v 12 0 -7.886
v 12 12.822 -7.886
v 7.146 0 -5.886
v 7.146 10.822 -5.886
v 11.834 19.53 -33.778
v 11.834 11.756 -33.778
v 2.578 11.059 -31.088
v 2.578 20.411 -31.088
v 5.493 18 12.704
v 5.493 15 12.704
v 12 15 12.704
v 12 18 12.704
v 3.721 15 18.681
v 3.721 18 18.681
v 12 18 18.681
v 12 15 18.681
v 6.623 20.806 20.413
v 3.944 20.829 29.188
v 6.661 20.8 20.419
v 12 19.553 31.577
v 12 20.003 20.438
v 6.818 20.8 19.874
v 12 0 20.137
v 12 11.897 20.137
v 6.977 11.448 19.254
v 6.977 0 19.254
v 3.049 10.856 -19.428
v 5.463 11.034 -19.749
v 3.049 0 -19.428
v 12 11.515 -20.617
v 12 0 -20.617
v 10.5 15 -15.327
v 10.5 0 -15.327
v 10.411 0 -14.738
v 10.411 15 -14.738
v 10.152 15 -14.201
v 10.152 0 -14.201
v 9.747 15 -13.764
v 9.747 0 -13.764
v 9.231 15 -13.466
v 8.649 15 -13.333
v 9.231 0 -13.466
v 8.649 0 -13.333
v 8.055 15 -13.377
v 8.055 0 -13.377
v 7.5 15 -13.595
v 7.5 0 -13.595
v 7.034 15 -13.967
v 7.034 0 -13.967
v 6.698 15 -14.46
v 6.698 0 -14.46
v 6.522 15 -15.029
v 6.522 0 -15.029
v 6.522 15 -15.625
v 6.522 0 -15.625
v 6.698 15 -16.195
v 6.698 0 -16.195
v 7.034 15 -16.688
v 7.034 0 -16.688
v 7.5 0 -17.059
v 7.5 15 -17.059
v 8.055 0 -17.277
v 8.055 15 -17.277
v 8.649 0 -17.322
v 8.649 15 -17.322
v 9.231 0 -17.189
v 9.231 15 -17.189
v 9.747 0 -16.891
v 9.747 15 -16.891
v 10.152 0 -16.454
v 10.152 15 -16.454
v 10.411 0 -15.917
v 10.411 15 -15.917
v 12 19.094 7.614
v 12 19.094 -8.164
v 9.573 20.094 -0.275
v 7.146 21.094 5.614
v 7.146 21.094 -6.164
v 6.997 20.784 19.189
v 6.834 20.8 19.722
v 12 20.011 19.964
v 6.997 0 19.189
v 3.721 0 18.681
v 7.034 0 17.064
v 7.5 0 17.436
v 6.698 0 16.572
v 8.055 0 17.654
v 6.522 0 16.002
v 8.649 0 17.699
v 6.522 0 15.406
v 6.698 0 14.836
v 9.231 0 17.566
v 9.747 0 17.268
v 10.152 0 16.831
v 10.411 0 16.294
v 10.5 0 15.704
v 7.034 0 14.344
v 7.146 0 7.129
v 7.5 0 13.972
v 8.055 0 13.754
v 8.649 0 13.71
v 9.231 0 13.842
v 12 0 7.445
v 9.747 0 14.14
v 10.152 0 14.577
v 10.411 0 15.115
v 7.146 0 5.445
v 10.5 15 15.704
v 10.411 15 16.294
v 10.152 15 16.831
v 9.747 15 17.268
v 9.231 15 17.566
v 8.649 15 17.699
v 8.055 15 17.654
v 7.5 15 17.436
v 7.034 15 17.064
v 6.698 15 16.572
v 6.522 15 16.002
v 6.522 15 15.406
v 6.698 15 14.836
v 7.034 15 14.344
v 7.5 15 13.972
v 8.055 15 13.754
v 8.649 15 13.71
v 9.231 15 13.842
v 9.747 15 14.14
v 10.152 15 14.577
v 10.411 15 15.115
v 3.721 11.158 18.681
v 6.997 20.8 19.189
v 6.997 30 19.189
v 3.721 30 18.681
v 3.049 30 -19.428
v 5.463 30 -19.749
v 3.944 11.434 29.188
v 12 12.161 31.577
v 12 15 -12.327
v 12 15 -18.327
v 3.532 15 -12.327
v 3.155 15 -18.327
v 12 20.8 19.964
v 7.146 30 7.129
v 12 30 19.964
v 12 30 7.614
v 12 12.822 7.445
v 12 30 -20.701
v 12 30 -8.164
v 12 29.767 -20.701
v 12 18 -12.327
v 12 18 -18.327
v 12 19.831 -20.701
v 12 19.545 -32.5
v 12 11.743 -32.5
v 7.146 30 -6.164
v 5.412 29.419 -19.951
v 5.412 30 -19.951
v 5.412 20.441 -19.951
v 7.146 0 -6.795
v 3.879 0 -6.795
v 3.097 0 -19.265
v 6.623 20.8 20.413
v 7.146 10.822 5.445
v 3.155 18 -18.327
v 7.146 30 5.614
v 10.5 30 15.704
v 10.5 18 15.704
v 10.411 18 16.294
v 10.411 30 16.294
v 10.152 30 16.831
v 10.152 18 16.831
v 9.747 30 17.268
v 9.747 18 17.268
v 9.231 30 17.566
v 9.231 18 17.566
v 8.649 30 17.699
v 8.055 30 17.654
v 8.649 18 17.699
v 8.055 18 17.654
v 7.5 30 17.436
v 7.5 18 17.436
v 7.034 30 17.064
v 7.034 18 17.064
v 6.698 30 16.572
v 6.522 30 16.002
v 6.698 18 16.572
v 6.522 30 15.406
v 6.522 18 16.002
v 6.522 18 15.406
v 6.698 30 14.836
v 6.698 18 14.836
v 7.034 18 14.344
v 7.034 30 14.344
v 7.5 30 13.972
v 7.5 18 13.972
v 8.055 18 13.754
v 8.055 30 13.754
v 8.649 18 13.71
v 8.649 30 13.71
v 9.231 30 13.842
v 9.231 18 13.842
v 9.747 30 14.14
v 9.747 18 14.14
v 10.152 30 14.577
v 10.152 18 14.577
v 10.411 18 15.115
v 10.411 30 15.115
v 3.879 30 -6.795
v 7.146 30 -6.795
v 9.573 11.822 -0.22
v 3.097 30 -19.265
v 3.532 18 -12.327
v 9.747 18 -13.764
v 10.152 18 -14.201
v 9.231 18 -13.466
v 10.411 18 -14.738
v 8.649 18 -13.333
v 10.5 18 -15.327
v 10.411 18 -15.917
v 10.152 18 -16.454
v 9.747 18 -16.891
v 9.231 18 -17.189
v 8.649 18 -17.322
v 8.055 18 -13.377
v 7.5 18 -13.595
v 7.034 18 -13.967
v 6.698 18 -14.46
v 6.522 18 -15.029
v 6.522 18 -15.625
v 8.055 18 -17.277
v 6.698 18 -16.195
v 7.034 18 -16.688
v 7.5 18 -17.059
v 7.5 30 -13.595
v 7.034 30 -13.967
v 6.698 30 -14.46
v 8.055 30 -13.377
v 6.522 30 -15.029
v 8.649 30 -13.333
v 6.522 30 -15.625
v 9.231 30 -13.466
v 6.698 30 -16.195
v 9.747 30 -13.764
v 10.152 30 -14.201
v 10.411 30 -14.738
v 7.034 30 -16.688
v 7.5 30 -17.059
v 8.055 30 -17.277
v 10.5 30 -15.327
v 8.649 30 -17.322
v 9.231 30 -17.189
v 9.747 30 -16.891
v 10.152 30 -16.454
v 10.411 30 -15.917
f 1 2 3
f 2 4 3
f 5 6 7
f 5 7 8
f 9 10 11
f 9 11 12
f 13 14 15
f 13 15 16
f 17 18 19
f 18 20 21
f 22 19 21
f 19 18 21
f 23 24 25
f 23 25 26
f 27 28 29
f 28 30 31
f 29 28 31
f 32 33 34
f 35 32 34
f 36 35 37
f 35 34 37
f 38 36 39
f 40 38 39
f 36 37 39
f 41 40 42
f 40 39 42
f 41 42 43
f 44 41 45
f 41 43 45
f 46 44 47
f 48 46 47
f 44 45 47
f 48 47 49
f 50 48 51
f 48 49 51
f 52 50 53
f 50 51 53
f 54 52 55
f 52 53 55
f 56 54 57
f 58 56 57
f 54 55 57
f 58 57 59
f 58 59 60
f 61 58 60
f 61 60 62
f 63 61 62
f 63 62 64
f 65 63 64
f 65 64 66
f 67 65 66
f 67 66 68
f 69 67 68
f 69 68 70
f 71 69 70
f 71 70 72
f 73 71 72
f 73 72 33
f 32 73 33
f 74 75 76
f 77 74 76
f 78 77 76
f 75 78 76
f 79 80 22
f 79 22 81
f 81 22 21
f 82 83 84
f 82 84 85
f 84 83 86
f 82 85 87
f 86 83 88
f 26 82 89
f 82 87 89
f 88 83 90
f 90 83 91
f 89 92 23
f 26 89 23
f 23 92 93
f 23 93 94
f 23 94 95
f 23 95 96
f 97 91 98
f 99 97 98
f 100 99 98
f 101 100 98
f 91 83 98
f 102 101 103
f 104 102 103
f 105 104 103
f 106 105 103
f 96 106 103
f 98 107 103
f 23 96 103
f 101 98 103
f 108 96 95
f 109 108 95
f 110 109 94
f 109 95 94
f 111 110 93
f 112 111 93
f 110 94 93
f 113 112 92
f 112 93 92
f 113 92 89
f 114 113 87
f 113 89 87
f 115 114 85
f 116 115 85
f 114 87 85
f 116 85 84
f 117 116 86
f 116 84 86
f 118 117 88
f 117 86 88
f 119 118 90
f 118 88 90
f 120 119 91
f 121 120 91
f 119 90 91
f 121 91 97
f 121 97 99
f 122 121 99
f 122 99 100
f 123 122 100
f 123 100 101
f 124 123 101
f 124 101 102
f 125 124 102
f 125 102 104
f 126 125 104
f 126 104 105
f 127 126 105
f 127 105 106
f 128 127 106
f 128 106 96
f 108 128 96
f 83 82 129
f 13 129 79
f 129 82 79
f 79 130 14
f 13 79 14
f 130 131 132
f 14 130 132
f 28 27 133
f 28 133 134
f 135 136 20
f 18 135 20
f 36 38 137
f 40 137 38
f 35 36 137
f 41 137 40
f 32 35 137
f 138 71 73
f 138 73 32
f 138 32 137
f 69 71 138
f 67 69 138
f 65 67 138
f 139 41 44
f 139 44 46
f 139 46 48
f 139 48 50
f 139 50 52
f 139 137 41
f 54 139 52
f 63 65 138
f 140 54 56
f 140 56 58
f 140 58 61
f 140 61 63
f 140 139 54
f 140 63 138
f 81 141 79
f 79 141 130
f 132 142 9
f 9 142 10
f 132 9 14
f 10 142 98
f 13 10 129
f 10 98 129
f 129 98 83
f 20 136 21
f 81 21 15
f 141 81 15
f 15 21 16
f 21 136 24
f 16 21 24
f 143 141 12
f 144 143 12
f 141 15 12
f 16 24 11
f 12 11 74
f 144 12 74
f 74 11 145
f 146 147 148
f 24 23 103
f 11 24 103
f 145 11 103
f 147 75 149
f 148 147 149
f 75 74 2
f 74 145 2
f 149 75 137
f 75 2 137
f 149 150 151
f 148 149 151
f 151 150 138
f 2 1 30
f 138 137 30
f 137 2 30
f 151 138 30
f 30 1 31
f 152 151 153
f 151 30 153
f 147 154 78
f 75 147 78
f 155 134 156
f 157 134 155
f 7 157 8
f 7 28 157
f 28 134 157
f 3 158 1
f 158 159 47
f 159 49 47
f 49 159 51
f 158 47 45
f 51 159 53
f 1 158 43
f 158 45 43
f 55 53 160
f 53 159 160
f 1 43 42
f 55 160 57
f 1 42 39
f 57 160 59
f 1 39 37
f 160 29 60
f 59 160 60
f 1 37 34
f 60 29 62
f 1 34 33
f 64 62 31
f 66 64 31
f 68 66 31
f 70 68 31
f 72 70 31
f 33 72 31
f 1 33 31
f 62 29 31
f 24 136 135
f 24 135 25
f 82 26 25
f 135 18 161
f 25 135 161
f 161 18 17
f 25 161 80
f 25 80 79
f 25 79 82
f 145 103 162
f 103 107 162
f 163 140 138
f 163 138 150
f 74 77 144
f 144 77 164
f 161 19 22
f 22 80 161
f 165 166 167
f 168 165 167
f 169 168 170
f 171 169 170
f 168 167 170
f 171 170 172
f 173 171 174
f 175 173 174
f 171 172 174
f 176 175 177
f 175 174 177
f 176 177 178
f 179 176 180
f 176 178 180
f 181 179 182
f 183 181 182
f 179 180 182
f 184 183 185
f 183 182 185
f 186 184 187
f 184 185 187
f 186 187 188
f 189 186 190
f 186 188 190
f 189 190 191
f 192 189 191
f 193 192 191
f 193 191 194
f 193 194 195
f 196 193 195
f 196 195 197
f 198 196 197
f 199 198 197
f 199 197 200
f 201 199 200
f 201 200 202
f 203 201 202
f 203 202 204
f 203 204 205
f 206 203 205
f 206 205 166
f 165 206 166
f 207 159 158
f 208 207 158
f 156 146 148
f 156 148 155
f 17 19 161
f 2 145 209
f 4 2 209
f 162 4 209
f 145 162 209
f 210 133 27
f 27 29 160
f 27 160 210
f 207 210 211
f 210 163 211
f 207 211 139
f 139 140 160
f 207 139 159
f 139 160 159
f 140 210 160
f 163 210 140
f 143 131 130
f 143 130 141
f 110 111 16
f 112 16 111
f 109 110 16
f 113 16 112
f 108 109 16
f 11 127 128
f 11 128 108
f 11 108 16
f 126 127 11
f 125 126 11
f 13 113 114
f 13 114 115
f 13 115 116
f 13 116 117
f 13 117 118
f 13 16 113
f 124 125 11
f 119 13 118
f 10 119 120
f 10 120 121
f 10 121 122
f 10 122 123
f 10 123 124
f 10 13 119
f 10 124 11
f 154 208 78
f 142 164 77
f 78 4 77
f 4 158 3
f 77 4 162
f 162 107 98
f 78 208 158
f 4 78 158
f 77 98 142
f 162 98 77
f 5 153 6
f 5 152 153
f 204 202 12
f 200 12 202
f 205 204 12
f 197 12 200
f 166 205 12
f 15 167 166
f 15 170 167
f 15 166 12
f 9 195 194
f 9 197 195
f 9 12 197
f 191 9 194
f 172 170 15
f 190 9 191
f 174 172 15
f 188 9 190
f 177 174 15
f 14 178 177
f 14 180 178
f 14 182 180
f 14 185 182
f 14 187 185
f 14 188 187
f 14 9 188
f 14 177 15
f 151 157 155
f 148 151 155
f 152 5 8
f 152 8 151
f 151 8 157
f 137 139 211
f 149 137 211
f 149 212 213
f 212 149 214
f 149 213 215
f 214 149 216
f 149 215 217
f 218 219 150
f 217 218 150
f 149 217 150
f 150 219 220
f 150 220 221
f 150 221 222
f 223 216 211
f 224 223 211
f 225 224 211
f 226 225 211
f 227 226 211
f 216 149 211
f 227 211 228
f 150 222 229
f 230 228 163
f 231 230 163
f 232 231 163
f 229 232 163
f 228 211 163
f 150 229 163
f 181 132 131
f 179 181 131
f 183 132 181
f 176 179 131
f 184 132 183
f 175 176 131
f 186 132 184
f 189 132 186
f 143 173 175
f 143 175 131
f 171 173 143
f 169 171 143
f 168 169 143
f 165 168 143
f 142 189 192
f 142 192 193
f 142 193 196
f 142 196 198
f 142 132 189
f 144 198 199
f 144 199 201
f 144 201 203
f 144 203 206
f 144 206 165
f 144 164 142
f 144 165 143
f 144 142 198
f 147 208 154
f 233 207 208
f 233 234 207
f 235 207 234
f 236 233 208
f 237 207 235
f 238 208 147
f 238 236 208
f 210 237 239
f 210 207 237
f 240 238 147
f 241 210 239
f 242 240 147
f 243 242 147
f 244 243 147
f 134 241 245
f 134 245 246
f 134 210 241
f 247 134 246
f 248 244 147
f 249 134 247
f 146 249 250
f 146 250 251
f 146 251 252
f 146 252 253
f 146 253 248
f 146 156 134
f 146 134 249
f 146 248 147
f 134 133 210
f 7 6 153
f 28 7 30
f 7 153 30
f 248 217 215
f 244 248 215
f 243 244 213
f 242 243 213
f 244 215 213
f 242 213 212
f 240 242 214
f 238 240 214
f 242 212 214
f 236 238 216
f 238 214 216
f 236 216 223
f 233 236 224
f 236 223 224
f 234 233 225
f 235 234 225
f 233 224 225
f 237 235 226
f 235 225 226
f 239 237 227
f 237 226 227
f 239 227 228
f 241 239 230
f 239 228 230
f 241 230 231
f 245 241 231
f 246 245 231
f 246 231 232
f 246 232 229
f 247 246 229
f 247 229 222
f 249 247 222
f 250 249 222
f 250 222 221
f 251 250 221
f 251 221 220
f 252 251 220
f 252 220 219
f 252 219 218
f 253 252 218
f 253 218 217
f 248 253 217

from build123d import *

# Parameters (mm, degrees)
SKETCH_2_W               = 27
SKETCH_2_H               = 75
EXTRUDE_1_DEPTH          = 30
FILLET_1_R               = 5
CUT_EXTRUDE_1_DEPTH      = 10
CUT_EXTRUDE_1_DEPTH_BACK = 62.976777909
SKETCH_3_W               = 12.003584996
SKETCH_3_H               = 8.623265084
SKETCH_3_W_2             = 13.38824361
SKETCH_3_H_2             = 10.855989936
CUT_EXTRUDE_2_DEPTH      = 56.093103017
CUT_EXTRUDE_2_DEPTH_BACK = 56.093103017
SKETCH_4_W               = 11.777688934
SKETCH_4_H               = 8.406294685
SKETCH_4_W_2             = 11.330835953
SKETCH_4_H_2             = 19.308390714
CUT_EXTRUDE_3_DEPTH      = 10
CUT_EXTRUDE_3_DEPTH_BACK = 62.976777909
SKETCH_5_W               = 10.454752522
SKETCH_5_H               = 7.917134022
SKETCH_5_W_2             = 10.247562273
SKETCH_5_H_2             = 14.675567582
CUT_EXTRUDE_4_DEPTH      = 51.311529494
CUT_EXTRUDE_5_DEPTH      = 1
CUT_EXTRUDE_6_DEPTH      = 56.093103188
CUT_EXTRUDE_6_DEPTH_BACK = 56.093103188
CUT_EXTRUDE_7_DEPTH      = 56.093103188
CUT_EXTRUDE_7_DEPTH_BACK = 56.093103188
SKETCH_28_R              = 2
CUT_EXTRUDE_8_DEPTH      = 53.794412747
CUT_EXTRUDE_9_DEPTH      = 51.311529658
SKETCH_30_W              = 10.059160286
SKETCH_30_H              = 37.902915959
SKETCH_30_W_2            = 15.489849721
SKETCH_30_H_2            = 38.902668553
CUT_EXTRUDE_10_DEPTH     = 51.038113138
SKETCH_31_W              = 8.737975265
SKETCH_31_H              = 34.755902135
SKETCH_31_W_2            = 10.96580713
CUT_EXTRUDE_11_DEPTH     = 49.583503796
CUT_EXTRUDE_12_DEPTH     = 50.524399755
CUT_EXTRUDE_13_DEPTH     = 48.916784232
SKETCH_35_W              = 30.266892165
SKETCH_35_H              = 64.418514712
CUT_EXTRUDE_14_DEPTH     = 49.293556396
SKETCH_36_W              = 14.582556354
SKETCH_36_H              = 32.207236855
CUT_EXTRUDE_15_DEPTH     = 49.026638847
CUT_EXTRUDE_16_DEPTH     = 47.743690696
CUT_EXTRUDE_17_DEPTH     = 47.743690696
CUT_EXTRUDE_19_DEPTH     = 9.2
CUT_EXTRUDE_20_REACH     = 64.237
CUT_EXTRUDE_21_REACH     = 48.744
SKETCH_41_W              = 6
SKETCH_41_H              = 3


with BuildPart() as part:
    # 草图2 → 凸台-拉伸1 (new body)
    with BuildSketch(Plane(origin=(0, 0, 0), x_dir=(1, 0, 0), z_dir=(0, 1, 0))):
        with Locations((-1.5, 0)):
            Rectangle(SKETCH_2_W, SKETCH_2_H)
    extrude(amount=EXTRUDE_1_DEPTH)

    # 圆角1
    fillet_1_edges = [part.edges().sort_by_distance(p)[0] for p in [
        (12, 15, -37.5),
        (12, 15, 37.5),
    ]]
    fillet(fillet_1_edges, radius=FILLET_1_R)

    # 草图3 → 切除-拉伸1 (cut, two sides: drawn at the far end of the back side and taken through both)
    with BuildSketch(Plane(origin=(18.680874692, 0, -5.005525288), x_dir=(-0.2588190451025125, 0, -0.9659258262890705), z_dir=(0.9659258262890705, 0, -0.2588190451025125)).offset(-CUT_EXTRUDE_1_DEPTH_BACK)):
        with Locations((24.234815862, 24.978507534)):
            Rectangle(SKETCH_3_W, SKETCH_3_H)
        with Locations((24.671178169, 5.427994968)):
            Rectangle(SKETCH_3_W_2, SKETCH_3_H_2)
    extrude(amount=CUT_EXTRUDE_1_DEPTH + CUT_EXTRUDE_1_DEPTH_BACK, mode=Mode.SUBTRACT)

    # 草图4 → 切除-拉伸2 (cut, two sides: drawn at the far end of the back side and taken through both)
    with BuildSketch(Plane(origin=(12, 0, 0), x_dir=(0, 0, -1), z_dir=(1, 0, 0)).offset(-CUT_EXTRUDE_2_DEPTH_BACK)):
        with Locations((0.274688021, 25.296852658)):
            Rectangle(SKETCH_4_W, SKETCH_4_H)
        with Locations((0.220425577, 1.167429902)):
            Rectangle(SKETCH_4_W_2, SKETCH_4_H_2)
    extrude(amount=CUT_EXTRUDE_2_DEPTH + CUT_EXTRUDE_2_DEPTH_BACK, mode=Mode.SUBTRACT)

    # 草图5 → 切除-拉伸3 (cut, two sides: drawn at the far end of the back side and taken through both)
    with BuildSketch(Plane(origin=(18.680874692, 0, 5.005525288), x_dir=(0.25881904510251236, 0, -0.9659258262890705), z_dir=(0.9659258262890706, 0, 0.25881904510251236)).offset(-CUT_EXTRUDE_3_DEPTH_BACK)):
        with Locations((-23.173403852, 25.272433697)):
            Rectangle(SKETCH_5_W, SKETCH_5_H)
        with Locations((-23.069808728, 2.959186052)):
            Rectangle(SKETCH_5_W_2, SKETCH_5_H_2)
    extrude(amount=CUT_EXTRUDE_3_DEPTH + CUT_EXTRUDE_3_DEPTH_BACK, mode=Mode.SUBTRACT)

    # 草图6 → 切除-拉伸4 (cut, through all)
    with BuildSketch(Plane.XZ):
        Polygon((7.146107594, 7.129038799), (3.725036618, 18.666143782), (-0.059848724, 31.430164127), (-15, 28.234595706), (-15, -49.974737356), (-6.027187149, -52.37103324), (-0.374019248, -31.203022256), (3.096542815, -19.264972049), (3.878697096, -6.795389704), (7.146107594, -6.795389704), align=None)
    extrude(amount=-CUT_EXTRUDE_4_DEPTH, mode=Mode.SUBTRACT)

    # 草图9 → 切除-放样2 section 0
    with BuildSketch(Plane(origin=(20.612726345, 0, -5.523163378), x_dir=(-0.2588190451025125, 0, -0.9659258262890705), z_dir=(0.9659258262890705, 0, -0.2588190451025125))):
        with BuildLine():
            Line((30.994329497, 19.422837815), (16.233023364, 19.422837815))
            Line((16.233023364, 19.422837815), (16.233023364, 30))
            Line((16.233023364, 30), (30.994329497, 30))
            Line((30.994329497, 30), (30.994329497, 19.422837815))
        make_face()
    # 草图8 → 切除-放样2 section 1
    with BuildSketch(Plane(origin=(8.019388794, 0, -2.331351103), x_dir=(-0.27915709503779457, 0, -0.9602454458574953), z_dir=(0.9602454458574953, 0, -0.27915709503779457))):
        with BuildLine():
            Line((30.066970145, 29.290140076), (18.060708335, 29.290140076))
            Line((18.060708335, 29.290140076), (18.060708335, 20.666874992))
            Line((18.060708335, 20.666874992), (30.066970145, 20.666874992))
            Line((30.066970145, 20.666874992), (30.066970145, 29.290140076))
        make_face()
    loft(mode=Mode.SUBTRACT)

    # 草图12 → 切除-放样4 section 0
    with BuildSketch(Plane(origin=(8.019388794, 0, -2.331351103), x_dir=(-0.27915709503779457, 0, -0.9602454458574953), z_dir=(0.9602454458574953, 0, -0.27915709503779457))):
        with BuildLine():
            Line((31.19539038, 0), (31.19539038, 10.855989936))
            Line((31.19539038, 10.855989936), (30.066970145, 10.855989936))
            Line((30.066970145, 10.855989936), (17.804684254, 10.855989936))
            Line((17.804684254, 10.855989936), (17.804684254, 0))
            Line((17.804684254, 0), (31.19539038, 0))
        make_face()
    # 草图11 → 切除-放样4 section 1
    with BuildSketch(Plane(origin=(20.612726345, 0, -5.523163378), x_dir=(-0.2588190451025125, 0, -0.9659258262890705), z_dir=(0.9659258262890705, 0, -0.2588190451025125))):
        with BuildLine():
            Line((16.233023364, 11.839832351), (31.553216936, 11.839832351))
            Line((31.553216936, 11.839832351), (31.553216936, 0))
            Line((31.553216936, 0), (16.233023364, 0))
            Line((16.233023364, 0), (16.233023364, 11.839832351))
        make_face()
    loft(mode=Mode.SUBTRACT)

    # 草图16 → 切除-放样5 section 0
    with BuildSketch(Plane(origin=(12, 0, 0), x_dir=(0, 0, -1), z_dir=(1, 0, 0))):
        with BuildLine():
            Line((-7.444992399, 12.821625259), (7.885843554, 12.821625259))
            Line((7.885843554, 12.821625259), (7.885843554, 0))
            Line((7.885843554, 0), (-7.444992399, 0))
            Line((-7.444992399, 0), (-7.444992399, 12.821625259))
        make_face()
    # 草图15 → 切除-放样5 section 1
    with BuildSketch(Plane.ZY.offset(-7.146107594)):
        with BuildLine():
            Line((5.444992399, 0), (5.444992399, 10.821625259))
            Line((5.444992399, 10.821625259), (-5.885843554, 10.821625259))
            Line((-5.885843554, 10.821625259), (-5.885843554, 0))
            Line((-5.885843554, 0), (5.444992399, 0))
        make_face()
    loft(mode=Mode.SUBTRACT)

    # 草图18 → 切除-放样6 section 0
    with BuildSketch(Plane(origin=(12, 0, 0), x_dir=(0, 0, -1), z_dir=(1, 0, 0))):
        with BuildLine():
            Line((8.163532488, 19.093705315), (-7.614156446, 19.093705315))
            Line((-7.614156446, 19.093705315), (-7.614156446, 30))
            Line((-7.614156446, 30), (8.163532488, 30))
            Line((8.163532488, 30), (8.163532488, 19.093705315))
        make_face()
    # 草图17 → 切除-放样6 section 1
    with BuildSketch(Plane.ZY.offset(-7.146107594)):
        with BuildLine():
            Line((5.614156446, 29.5), (-6.163532488, 29.5))
            Line((-6.163532488, 29.5), (-6.163532488, 21.093705315))
            Line((-6.163532488, 21.093705315), (5.614156446, 21.093705315))
            Line((5.614156446, 21.093705315), (5.614156446, 29.5))
        make_face()
    loft(mode=Mode.SUBTRACT)

    # 草图20 → 切除-放样7 section 0
    with BuildSketch(Plane(origin=(8.511647159, 0, 2.523938986), x_dir=(-0.28429225609974595, 0, 0.9587376664769757), z_dir=(-0.9587376664769756, 0, -0.2842922560997459))):
        with BuildLine():
            Line((28.175687949, 29.231000708), (28.175687949, 21.313866686))
            Line((28.175687949, 21.313866686), (17.717272084, 21.313866686))
            Line((17.717272084, 21.313866686), (17.717272084, 29.231000708))
            Line((17.717272084, 29.231000708), (28.175687949, 29.231000708))
        make_face()
    # 草图19 → 切除-放样7 section 1
    with BuildSketch(Plane(origin=(20.612726345, 0, 5.523163378), x_dir=(0.25881904510251236, 0, -0.9659258262890705), z_dir=(0.9659258262890706, 0, 0.25881904510251236))):
        with BuildLine():
            Line((-30.400780113, 30), (-15.946027591, 30))
            Line((-15.946027591, 30), (-15.946027591, 19.313866686))
            Line((-15.946027591, 19.313866686), (-30.400780113, 19.313866686))
            Line((-30.400780113, 19.313866686), (-30.400780113, 30))
        make_face()
    loft(mode=Mode.SUBTRACT)

    # 草图23 → 切除-放样8 section 0
    with BuildSketch(Plane(origin=(8.511647159, 0, 2.523938986), x_dir=(-0.28429225609974595, 0, 0.9587376664769757), z_dir=(-0.9587376664769756, 0, -0.2842922560997459))):
        with BuildLine():
            Line((16.852369456, 0), (28.787602444, 0))
            Line((28.787602444, 0), (28.787602444, 11.157572741))
            Line((28.787602444, 11.157572741), (16.852369456, 11.157572741))
            Line((16.852369456, 11.157572741), (16.852369456, 0))
        make_face()
    # 草图21 → 切除-放样8 section 1
    with BuildSketch(Plane(origin=(20.612726345, 0, 5.523163378), x_dir=(0.25881904510251236, 0, -0.9659258262890705), z_dir=(0.9659258262890706, 0, 0.25881904510251236))):
        with BuildLine():
            Line((-30.286760813, 12.296969843), (-15.946027591, 12.296969843))
            Line((-15.946027591, 12.296969843), (-15.946027591, 0))
            Line((-15.946027591, 0), (-30.286760813, 0))
            Line((-30.286760813, 0), (-30.286760813, 12.296969843))
        make_face()
    loft(mode=Mode.SUBTRACT)

    # 草图25 → 切除-拉伸5 (cut)
    with BuildSketch(Plane(origin=(0, 30, 0), x_dir=(1, 0, 0), z_dir=(0, 1, 0))):
        with BuildLine():
            Line((0.501517264, -29.537032302), (11.625363064, -34.398951428))
            ThreePointArc((11.625363064, -34.398951428), (11.905446734, -33.46777701), (12, -32.5))
            Line((12, -32.5), (12, -20.437772986))
            Line((12, -20.437772986), (3.474763906, -19.51015508))
            Line((3.474763906, -19.51015508), (0.501517264, -29.537032302))
        make_face()
        with BuildLine():
            Line((12, 20.700973532), (2.977613921, 19.674064031))
            Line((2.977613921, 19.674064031), (-0.374019248, 31.203022256))
            Line((-0.374019248, 31.203022256), (11.306961147, 35.039701887))
            ThreePointArc((11.306961147, 35.039701887), (11.823629636, 33.816281555), (12, 32.5))
            Line((12, 32.5), (12, 20.700973532))
        make_face()
        Polygon((7.146107594, 6.163532488), (12, 8.163532488), (12, -7.614156446), (7.146107594, -5.614156446), align=None)
    extrude(amount=-CUT_EXTRUDE_5_DEPTH, mode=Mode.SUBTRACT)

    # 草图26 → 切除-拉伸6 (cut, two sides: drawn at the far end of the back side and taken through both)
    with BuildSketch(Plane(origin=(12, 0, 0), x_dir=(0, 0, -1), z_dir=(1, 0, 0)).offset(-CUT_EXTRUDE_6_DEPTH_BACK)):
        with BuildLine():
            Line((-37.5, 3.256499349), (-43.423283477, 4.717056112))
            Line((-43.423283477, 4.717056112), (-37.5, 28.189374855))
            ThreePointArc((-37.5, 28.189374855), (-35.985697907, 15.722937102), (-37.5, 3.256499349))
        make_face()
    extrude(amount=CUT_EXTRUDE_6_DEPTH + CUT_EXTRUDE_6_DEPTH_BACK, mode=Mode.SUBTRACT)

    # 草图27 → 切除-拉伸7 (cut, two sides: drawn at the far end of the back side and taken through both)
    with BuildSketch(Plane(origin=(12, 0, 0), x_dir=(0, 0, -1), z_dir=(1, 0, 0)).offset(-CUT_EXTRUDE_7_DEPTH_BACK)):
        with BuildLine():
            Line((37.5, 4.153795449), (43.060589444, 13.210819797))
            Line((43.060589444, 13.210819797), (37.5, 25.846204551))
            ThreePointArc((37.5, 25.846204551), (35.824484835, 15), (37.5, 4.153795449))
        make_face()
    extrude(amount=CUT_EXTRUDE_7_DEPTH + CUT_EXTRUDE_7_DEPTH_BACK, mode=Mode.SUBTRACT)

    # 草图28 → 切除-拉伸8 (cut, through all)
    with BuildSketch(Plane.XZ.offset(4)):
        with Locations((-10.5, 33.410449294)):
            Circle(SKETCH_28_R)
        with Locations((8.5, 15.704094532)):
            Circle(SKETCH_28_R)
        with Locations((8.5, -15.327351188)):
            Circle(SKETCH_28_R)
    extrude(amount=-CUT_EXTRUDE_8_DEPTH, mode=Mode.SUBTRACT)

    # 草图29 → 切除-拉伸9 (cut, through all)
    with BuildSketch(Plane(origin=(0, 30, 0), x_dir=(1, 0, 0), z_dir=(0, 1, 0))):
        Polygon((-0.059848724, -31.430164127), (-2.314184215, -39.032609504), (-18.769782414, -40.942420712), (-19.653149801, -21.861685155), align=None)
    extrude(amount=-CUT_EXTRUDE_9_DEPTH, mode=Mode.SUBTRACT)

    # 草图30 → 切除-拉伸10 (cut, through all)
    with BuildSketch(Plane(origin=(12, 0, 0), x_dir=(0, 0, -1), z_dir=(1, 0, 0))):
        with Locations((-40.437824351, 17.746407142)):
            Rectangle(SKETCH_30_W, SKETCH_30_H)
        with Locations((43.465090291, 13.206278768)):
            Rectangle(SKETCH_30_W_2, SKETCH_30_H_2)
    extrude(amount=-CUT_EXTRUDE_10_DEPTH, mode=Mode.SUBTRACT)

    # 草图31 → 切除-拉伸11 (cut, through all)
    with BuildSketch(Plane(origin=(12, 0, 0), x_dir=(0, 0, -1), z_dir=(1, 0, 0))):
        with Locations((-38.655263386, 17.377951067)):
            Rectangle(SKETCH_31_W, SKETCH_31_H)
        with Locations((41.058750353, 17.377951067)):
            Rectangle(SKETCH_31_W_2, SKETCH_31_H)
    extrude(amount=-CUT_EXTRUDE_11_DEPTH, mode=Mode.SUBTRACT)

    # 草图32 → 切除-拉伸12 (cut, through all)
    with BuildSketch(Plane(origin=(8.511647159, 0, 2.523938986), x_dir=(-0.28429225609974595, 0, 0.9587376664769757), z_dir=(-0.9587376664769756, 0, -0.2842922560997459))):
        with BuildLine():
            Line((33.129330241, 28), (45.117943931, 24.625279412))
            Line((45.117943931, 24.625279412), (33.129330241, 2))
            ThreePointArc((33.129330241, 2), (29.425195526, 15), (33.129330241, 28))
        make_face()
    extrude(amount=-CUT_EXTRUDE_12_DEPTH, mode=Mode.SUBTRACT)

    # 草图33 → 切除-拉伸13 (cut, through all)
    with BuildSketch(Plane(origin=(7.429248175, 0, -1.984068666), x_dir=(0.25801907586145423, 0, 0.966139822433379), z_dir=(-0.966139822433379, 0, 0.25801907586145423))):
        with BuildLine():
            Line((-34.769064831, 27), (-43.42515103, 23.964002922))
            Line((-43.42515103, 23.964002922), (-34.769064831, 3))
            ThreePointArc((-34.769064831, 3), (-31.367076602, 15), (-34.769064831, 27))
        make_face()
    extrude(amount=-CUT_EXTRUDE_13_DEPTH, mode=Mode.SUBTRACT)

    # 草图35 → 切除-拉伸14 (cut, through all)
    with BuildSketch(Plane(origin=(8.019388794, 0, -2.331351103), x_dir=(0.2791570950377951, 0, 0.960245445857495), z_dir=(-0.9602454458574952, 0, 0.2791570950377951))):
        with Locations((-44.26539168, 12.1099661)):
            Rectangle(SKETCH_35_W, SKETCH_35_H)
    extrude(amount=-CUT_EXTRUDE_14_DEPTH, mode=Mode.SUBTRACT)

    # 草图36 → 切除-拉伸15 (cut, through all)
    with BuildSketch(Plane(origin=(8.511647159, 0, 2.523938986), x_dir=(-0.28429225609974595, 0, 0.9587376664769757), z_dir=(-0.9587376664769756, 0, -0.2842922560997459))):
        with Locations((34.154155961, 16.103618428)):
            Rectangle(SKETCH_36_W, SKETCH_36_H)
    extrude(amount=-CUT_EXTRUDE_15_DEPTH, mode=Mode.SUBTRACT)

    # 草图37 → 切除-拉伸16 (cut, through all)
    with BuildSketch(Plane.XZ):
        Polygon((3.04908486, -19.428218073), (5.463167808, -19.748869392), (2.578231647, -31.0875489), (0.855497841, -35.943044952), (-10.048623229, -28.744086493), align=None)
    extrude(amount=-CUT_EXTRUDE_16_DEPTH, mode=Mode.SUBTRACT)

    # 草图38 → 切除-拉伸17 (cut, through all)
    with BuildSketch(Plane(origin=(0, 30, 0), x_dir=(1, 0, 0), z_dir=(0, 1, 0))):
        Polygon((3.943504332, -29.188365604), (6.997098327, -19.188702801), (3.720649026, -18.680940353), (-14.795599346, -29.188365604), align=None)
    extrude(amount=-CUT_EXTRUDE_17_DEPTH, mode=Mode.SUBTRACT)

    # 草图39 → 切除-拉伸19 (cut)
    with BuildSketch(Plane(origin=(0, 30, 0), x_dir=(1, 0, 0), z_dir=(0, 1, 0))):
        Polygon((6.997098327, -19.188702801), (12, -19.964019423), (12, -21.24661692), (6.623129677, -20.413345109), align=None)
    extrude(amount=-CUT_EXTRUDE_19_DEPTH, mode=Mode.SUBTRACT)

    # 切除-拉伸20: up to this plane
    cut_extrude_20_end = Plane(origin=(6.997098327, -0.0001, 19.188702801), z_dir=(0.15314527326355704, 0, -0.9882036861280322))
    # 草图40 → 切除-拉伸20 (cut, up to the surface)
    with BuildSketch(Plane(origin=(-2.057373604, 0, 18.908211655), x_dir=(0.9941324082517923, 0, 0.10817002756536495), z_dir=(-0.10817002756536495, 0, 0.9941324082517923)), mode=Mode.PRIVATE) as cut_extrude_20_sk1:
        Polygon((14.140343366, 20.8), (8.927435283, 20.8), (14.140343366, 20.003383314), align=None)
    cut_extrude_20_tool1 = split(extrude(cut_extrude_20_sk1.sketch, amount=-CUT_EXTRUDE_20_REACH, mode=Mode.PRIVATE), bisect_by=cut_extrude_20_end, keep=Keep.BOTH, mode=Mode.PRIVATE)
    add(cut_extrude_20_tool1.solids().sort_by_distance((10.27256, 20.534461, 20.249813))[0], mode=Mode.SUBTRACT)

    # 切除-拉伸21: up to this face of the body (flat: up to its plane)
    cut_extrude_21_end = Plane(part.part.faces().sort_by_distance((12, 15.17379026, -0.488369359))[0])
    # 草图41 → 切除-拉伸21 (cut, up to the picked face)
    with BuildSketch(Plane(origin=(0, 0, 0), x_dir=(0, 0, -1), z_dir=(1, 0, 0)), mode=Mode.PRIVATE) as cut_extrude_21_sk1:
        Polygon((-13.704094532, 15), (-12.704094532, 15), (-12.704094532, 18), (-18.680940353, 18), (-18.680940353, 15), align=None)
    cut_extrude_21_tool1 = split(extrude(cut_extrude_21_sk1.sketch, amount=CUT_EXTRUDE_21_REACH, mode=Mode.PRIVATE), bisect_by=cut_extrude_21_end, keep=Keep.BOTH, mode=Mode.PRIVATE)
    # 草图41 → 切除-拉伸21 (cut, up to the picked face)
    with BuildSketch(Plane(origin=(0, 0, 0), x_dir=(0, 0, -1), z_dir=(1, 0, 0)), mode=Mode.PRIVATE) as cut_extrude_21_sk2:
        with Locations((15.327351188, 16.5)):
            Rectangle(SKETCH_41_W, SKETCH_41_H)
    cut_extrude_21_tool2 = split(extrude(cut_extrude_21_sk2.sketch, amount=CUT_EXTRUDE_21_REACH, mode=Mode.PRIVATE), bisect_by=cut_extrude_21_end, keep=Keep.BOTH, mode=Mode.PRIVATE)
    add(cut_extrude_21_tool1.solids().sort_by(Axis((0, 16.5, 15.692517), (1, 0, 0)))[0], mode=Mode.SUBTRACT)
    add(cut_extrude_21_tool2.solids().sort_by(Axis((0, 16.5, -15.327351), (1, 0, 0)))[0], mode=Mode.SUBTRACT)


solid = part.part
